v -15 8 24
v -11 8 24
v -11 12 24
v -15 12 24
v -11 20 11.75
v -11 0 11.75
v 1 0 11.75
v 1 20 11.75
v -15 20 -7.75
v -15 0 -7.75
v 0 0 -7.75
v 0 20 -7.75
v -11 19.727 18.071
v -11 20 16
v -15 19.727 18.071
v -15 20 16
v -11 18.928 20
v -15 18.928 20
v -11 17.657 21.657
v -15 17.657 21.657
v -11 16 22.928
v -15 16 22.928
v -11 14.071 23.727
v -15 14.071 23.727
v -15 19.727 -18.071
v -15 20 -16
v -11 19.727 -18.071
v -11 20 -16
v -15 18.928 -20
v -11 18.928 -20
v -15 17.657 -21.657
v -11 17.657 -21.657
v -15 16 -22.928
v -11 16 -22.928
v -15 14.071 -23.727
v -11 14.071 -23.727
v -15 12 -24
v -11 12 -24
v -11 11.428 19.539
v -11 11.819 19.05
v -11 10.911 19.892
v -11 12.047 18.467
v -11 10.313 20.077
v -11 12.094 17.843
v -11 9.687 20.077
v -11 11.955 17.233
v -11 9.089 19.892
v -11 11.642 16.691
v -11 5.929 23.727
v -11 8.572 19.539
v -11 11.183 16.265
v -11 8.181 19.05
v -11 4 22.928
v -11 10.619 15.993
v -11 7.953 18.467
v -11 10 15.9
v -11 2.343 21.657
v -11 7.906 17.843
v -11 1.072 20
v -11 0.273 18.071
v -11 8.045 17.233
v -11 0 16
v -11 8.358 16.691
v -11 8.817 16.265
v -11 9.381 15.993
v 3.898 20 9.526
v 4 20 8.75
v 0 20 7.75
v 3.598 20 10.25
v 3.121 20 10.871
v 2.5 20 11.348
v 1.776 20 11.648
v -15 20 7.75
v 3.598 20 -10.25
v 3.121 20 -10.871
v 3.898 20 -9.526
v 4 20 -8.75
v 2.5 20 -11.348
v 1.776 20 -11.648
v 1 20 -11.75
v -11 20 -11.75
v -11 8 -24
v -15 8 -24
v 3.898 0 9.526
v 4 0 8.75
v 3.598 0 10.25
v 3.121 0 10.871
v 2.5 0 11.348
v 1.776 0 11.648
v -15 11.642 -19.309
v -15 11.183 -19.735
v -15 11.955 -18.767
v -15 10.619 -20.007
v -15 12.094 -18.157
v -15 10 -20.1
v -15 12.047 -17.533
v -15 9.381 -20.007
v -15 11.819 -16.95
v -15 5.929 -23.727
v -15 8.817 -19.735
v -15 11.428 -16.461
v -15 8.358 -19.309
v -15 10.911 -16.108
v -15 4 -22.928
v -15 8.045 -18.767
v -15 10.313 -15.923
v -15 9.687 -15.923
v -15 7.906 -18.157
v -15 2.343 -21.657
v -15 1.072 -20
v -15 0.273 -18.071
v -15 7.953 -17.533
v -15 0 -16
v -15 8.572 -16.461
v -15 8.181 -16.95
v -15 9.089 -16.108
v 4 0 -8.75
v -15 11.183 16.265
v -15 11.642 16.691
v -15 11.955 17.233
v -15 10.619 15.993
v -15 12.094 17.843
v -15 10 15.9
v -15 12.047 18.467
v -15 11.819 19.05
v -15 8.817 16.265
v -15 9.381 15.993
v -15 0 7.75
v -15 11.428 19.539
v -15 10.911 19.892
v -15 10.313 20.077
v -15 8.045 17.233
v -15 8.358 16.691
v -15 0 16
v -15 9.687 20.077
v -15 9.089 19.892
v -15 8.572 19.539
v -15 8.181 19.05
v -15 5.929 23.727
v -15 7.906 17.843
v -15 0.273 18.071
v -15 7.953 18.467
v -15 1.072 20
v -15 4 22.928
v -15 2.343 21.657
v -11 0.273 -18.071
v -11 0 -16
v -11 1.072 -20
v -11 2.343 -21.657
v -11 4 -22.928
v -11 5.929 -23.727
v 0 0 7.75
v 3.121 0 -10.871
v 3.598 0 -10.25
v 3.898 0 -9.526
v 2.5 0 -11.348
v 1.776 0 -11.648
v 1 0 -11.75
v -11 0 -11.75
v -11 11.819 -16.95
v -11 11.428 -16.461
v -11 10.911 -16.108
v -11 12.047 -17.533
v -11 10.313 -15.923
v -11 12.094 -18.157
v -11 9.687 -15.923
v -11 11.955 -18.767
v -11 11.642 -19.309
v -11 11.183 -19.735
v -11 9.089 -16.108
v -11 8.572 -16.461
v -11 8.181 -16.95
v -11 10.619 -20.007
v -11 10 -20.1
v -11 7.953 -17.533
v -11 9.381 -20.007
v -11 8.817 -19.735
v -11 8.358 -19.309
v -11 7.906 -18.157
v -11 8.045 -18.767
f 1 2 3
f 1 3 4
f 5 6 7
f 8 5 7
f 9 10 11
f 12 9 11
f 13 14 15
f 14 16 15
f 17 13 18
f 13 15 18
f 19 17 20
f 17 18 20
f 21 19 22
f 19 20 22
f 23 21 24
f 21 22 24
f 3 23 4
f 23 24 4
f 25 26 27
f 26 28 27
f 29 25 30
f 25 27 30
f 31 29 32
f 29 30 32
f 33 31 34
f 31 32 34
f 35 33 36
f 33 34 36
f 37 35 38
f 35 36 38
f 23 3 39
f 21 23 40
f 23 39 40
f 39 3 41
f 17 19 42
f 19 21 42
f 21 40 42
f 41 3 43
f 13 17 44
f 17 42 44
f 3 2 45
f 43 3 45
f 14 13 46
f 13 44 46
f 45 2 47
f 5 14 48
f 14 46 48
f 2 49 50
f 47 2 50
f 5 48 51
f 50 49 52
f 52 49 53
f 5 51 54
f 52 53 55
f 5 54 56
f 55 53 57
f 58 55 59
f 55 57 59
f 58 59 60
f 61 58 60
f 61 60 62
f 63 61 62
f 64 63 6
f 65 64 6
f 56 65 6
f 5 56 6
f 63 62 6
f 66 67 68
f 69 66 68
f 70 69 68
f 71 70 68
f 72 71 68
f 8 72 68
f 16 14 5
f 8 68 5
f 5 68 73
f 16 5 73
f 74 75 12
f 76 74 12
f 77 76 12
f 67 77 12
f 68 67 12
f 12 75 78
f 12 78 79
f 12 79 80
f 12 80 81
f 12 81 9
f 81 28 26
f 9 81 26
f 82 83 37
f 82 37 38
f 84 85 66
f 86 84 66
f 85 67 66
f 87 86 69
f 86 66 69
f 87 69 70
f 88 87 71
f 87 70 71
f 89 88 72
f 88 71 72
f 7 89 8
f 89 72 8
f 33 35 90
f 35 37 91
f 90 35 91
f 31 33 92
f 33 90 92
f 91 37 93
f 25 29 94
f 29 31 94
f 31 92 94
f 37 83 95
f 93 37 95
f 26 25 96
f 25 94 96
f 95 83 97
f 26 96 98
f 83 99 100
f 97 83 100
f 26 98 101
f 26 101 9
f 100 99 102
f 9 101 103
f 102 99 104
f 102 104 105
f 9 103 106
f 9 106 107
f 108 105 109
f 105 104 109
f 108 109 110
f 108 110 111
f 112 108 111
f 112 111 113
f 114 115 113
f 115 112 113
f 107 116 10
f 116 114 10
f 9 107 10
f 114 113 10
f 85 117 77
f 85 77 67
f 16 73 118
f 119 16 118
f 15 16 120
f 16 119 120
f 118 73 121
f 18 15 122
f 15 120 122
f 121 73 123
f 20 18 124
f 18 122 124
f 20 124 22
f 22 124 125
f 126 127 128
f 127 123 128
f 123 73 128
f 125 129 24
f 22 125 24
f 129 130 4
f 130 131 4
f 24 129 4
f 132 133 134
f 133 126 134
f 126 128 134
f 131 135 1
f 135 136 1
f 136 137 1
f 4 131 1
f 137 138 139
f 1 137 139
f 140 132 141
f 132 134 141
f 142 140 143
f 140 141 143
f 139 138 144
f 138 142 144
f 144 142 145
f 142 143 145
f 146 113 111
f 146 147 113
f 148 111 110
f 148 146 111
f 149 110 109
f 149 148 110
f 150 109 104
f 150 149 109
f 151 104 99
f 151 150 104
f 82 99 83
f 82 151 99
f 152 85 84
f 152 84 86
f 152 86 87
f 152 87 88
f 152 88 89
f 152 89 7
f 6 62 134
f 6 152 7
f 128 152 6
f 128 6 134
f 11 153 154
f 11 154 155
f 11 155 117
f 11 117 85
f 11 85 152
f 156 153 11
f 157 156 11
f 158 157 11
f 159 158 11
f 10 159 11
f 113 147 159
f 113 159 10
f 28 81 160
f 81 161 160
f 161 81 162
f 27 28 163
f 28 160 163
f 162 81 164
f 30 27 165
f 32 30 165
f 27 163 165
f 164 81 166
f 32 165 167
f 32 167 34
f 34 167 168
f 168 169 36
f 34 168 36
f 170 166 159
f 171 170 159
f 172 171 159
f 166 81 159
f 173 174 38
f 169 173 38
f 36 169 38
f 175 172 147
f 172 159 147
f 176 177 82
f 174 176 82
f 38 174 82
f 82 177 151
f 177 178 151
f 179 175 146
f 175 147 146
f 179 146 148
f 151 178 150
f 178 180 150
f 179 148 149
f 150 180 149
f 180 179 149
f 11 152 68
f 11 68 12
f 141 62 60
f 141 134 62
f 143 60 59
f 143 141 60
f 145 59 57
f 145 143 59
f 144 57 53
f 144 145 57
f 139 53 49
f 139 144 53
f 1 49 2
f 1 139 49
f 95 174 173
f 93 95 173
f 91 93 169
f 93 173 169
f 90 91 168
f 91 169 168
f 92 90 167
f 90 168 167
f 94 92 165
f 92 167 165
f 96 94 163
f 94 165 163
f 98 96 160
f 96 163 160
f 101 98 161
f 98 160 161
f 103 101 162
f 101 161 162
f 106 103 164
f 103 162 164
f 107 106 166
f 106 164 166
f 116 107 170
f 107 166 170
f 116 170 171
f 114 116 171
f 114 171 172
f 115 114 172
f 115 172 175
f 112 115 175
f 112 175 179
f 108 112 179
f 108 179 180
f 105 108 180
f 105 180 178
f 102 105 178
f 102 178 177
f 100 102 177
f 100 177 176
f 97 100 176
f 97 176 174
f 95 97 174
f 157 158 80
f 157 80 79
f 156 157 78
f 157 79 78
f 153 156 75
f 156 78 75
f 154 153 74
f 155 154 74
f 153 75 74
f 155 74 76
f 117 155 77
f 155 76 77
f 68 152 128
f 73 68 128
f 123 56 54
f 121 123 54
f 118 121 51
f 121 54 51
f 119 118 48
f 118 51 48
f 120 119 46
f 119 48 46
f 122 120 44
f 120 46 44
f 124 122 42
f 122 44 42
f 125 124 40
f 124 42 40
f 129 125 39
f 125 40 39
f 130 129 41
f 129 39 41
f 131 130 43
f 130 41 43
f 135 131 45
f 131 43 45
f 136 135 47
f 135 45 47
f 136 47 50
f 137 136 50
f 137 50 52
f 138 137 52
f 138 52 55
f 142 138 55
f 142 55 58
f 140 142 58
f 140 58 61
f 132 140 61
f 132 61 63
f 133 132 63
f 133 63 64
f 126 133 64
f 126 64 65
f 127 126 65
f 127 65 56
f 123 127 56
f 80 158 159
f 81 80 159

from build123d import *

# Parameters (mm, degrees)
EXTRUDE_1_DEPTH     = 20
SKETCH_3_R          = 2.1
CUT_EXTRUDE_1_DEPTH = 10
FILLET_1_R          = 8
FILLET_2_R          = 3


with BuildPart() as part:
    # 草图2 → 凸台-拉伸1 (new body)
    with BuildSketch(Plane(origin=(0, 0, 0), x_dir=(1, 0, 0), z_dir=(0, 1, 0))):
        Polygon((0, -7.75), (0, 7.75), (-11, 7.75), (-15, 7.75), (-15, 20), (-15, 24), (-11, 24), (-11, 20), (-11, 11.75), (-7, 11.75), (4, 11.75), (4, -11.75), (-7, -11.75), (-11, -11.75), (-11, -20), (-11, -24), (-15, -24), (-15, -20), (-15, -7.75), (-11, -7.75), align=None)
    extrude(amount=EXTRUDE_1_DEPTH)

    # 草图3 → 切除-拉伸1 (cut)
    with BuildSketch(Plane(origin=(-11, 0, 0), x_dir=(0, 0, -1), z_dir=(1, 0, 0))):
        with Locations((-18, 10)):
            Circle(SKETCH_3_R)
        with Locations((18, 10)):
            Circle(SKETCH_3_R)
    extrude(amount=-CUT_EXTRUDE_1_DEPTH, mode=Mode.SUBTRACT)

    # 圆角1
    fillet_1_edges = [part.edges().sort_by_distance(p)[0] for p in [
        (-13, 0, -24),
        (-13, 0, 24),
        (-13, 20, 24),
        (-13, 20, -24),
    ]]
    fillet(fillet_1_edges, radius=FILLET_1_R)

    # 圆角2
    fillet_2_edges = [part.edges().sort_by_distance(p)[0] for p in [
        (4, 10, -11.75),
        (4, 10, 11.75),
    ]]
    fillet(fillet_2_edges, radius=FILLET_2_R)


solid = part.part
